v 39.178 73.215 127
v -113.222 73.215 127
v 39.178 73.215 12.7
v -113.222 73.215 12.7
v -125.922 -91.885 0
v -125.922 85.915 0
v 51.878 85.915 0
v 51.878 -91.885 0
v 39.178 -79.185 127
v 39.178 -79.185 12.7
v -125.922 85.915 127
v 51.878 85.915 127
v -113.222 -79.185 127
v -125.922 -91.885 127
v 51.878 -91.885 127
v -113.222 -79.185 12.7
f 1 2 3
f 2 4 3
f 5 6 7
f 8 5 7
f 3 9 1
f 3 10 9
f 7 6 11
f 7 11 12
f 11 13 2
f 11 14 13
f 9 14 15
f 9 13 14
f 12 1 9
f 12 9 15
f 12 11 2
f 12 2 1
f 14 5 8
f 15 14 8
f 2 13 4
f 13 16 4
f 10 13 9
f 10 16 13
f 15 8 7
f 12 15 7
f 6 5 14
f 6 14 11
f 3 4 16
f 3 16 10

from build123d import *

# Parameters (mm, degrees)
F1_W     = 177.8
F1_H     = 177.8
F3_DEPTH = 127
F4_T     = -12.7


# Not quite as in the source:
# - a variable given as a bare number and used for a length is read in inches; the dataset says mm whatever the document's units were


with BuildPart() as f3:
    # F1 (on Top) → F3 (new body)
    with BuildSketch(Plane.XY):
        with Locations((-37.0218022674, -2.984662973)):
            Rectangle(F1_W, F1_H)
    extrude(amount=F3_DEPTH)

    # F4
    f4_openings = [f3.faces().sort_by_distance(p)[0] for p in [
        (-37.021802, -2.984663, 127),
    ]]
    offset(amount=F4_T, openings=f4_openings)


solid = f3.part
